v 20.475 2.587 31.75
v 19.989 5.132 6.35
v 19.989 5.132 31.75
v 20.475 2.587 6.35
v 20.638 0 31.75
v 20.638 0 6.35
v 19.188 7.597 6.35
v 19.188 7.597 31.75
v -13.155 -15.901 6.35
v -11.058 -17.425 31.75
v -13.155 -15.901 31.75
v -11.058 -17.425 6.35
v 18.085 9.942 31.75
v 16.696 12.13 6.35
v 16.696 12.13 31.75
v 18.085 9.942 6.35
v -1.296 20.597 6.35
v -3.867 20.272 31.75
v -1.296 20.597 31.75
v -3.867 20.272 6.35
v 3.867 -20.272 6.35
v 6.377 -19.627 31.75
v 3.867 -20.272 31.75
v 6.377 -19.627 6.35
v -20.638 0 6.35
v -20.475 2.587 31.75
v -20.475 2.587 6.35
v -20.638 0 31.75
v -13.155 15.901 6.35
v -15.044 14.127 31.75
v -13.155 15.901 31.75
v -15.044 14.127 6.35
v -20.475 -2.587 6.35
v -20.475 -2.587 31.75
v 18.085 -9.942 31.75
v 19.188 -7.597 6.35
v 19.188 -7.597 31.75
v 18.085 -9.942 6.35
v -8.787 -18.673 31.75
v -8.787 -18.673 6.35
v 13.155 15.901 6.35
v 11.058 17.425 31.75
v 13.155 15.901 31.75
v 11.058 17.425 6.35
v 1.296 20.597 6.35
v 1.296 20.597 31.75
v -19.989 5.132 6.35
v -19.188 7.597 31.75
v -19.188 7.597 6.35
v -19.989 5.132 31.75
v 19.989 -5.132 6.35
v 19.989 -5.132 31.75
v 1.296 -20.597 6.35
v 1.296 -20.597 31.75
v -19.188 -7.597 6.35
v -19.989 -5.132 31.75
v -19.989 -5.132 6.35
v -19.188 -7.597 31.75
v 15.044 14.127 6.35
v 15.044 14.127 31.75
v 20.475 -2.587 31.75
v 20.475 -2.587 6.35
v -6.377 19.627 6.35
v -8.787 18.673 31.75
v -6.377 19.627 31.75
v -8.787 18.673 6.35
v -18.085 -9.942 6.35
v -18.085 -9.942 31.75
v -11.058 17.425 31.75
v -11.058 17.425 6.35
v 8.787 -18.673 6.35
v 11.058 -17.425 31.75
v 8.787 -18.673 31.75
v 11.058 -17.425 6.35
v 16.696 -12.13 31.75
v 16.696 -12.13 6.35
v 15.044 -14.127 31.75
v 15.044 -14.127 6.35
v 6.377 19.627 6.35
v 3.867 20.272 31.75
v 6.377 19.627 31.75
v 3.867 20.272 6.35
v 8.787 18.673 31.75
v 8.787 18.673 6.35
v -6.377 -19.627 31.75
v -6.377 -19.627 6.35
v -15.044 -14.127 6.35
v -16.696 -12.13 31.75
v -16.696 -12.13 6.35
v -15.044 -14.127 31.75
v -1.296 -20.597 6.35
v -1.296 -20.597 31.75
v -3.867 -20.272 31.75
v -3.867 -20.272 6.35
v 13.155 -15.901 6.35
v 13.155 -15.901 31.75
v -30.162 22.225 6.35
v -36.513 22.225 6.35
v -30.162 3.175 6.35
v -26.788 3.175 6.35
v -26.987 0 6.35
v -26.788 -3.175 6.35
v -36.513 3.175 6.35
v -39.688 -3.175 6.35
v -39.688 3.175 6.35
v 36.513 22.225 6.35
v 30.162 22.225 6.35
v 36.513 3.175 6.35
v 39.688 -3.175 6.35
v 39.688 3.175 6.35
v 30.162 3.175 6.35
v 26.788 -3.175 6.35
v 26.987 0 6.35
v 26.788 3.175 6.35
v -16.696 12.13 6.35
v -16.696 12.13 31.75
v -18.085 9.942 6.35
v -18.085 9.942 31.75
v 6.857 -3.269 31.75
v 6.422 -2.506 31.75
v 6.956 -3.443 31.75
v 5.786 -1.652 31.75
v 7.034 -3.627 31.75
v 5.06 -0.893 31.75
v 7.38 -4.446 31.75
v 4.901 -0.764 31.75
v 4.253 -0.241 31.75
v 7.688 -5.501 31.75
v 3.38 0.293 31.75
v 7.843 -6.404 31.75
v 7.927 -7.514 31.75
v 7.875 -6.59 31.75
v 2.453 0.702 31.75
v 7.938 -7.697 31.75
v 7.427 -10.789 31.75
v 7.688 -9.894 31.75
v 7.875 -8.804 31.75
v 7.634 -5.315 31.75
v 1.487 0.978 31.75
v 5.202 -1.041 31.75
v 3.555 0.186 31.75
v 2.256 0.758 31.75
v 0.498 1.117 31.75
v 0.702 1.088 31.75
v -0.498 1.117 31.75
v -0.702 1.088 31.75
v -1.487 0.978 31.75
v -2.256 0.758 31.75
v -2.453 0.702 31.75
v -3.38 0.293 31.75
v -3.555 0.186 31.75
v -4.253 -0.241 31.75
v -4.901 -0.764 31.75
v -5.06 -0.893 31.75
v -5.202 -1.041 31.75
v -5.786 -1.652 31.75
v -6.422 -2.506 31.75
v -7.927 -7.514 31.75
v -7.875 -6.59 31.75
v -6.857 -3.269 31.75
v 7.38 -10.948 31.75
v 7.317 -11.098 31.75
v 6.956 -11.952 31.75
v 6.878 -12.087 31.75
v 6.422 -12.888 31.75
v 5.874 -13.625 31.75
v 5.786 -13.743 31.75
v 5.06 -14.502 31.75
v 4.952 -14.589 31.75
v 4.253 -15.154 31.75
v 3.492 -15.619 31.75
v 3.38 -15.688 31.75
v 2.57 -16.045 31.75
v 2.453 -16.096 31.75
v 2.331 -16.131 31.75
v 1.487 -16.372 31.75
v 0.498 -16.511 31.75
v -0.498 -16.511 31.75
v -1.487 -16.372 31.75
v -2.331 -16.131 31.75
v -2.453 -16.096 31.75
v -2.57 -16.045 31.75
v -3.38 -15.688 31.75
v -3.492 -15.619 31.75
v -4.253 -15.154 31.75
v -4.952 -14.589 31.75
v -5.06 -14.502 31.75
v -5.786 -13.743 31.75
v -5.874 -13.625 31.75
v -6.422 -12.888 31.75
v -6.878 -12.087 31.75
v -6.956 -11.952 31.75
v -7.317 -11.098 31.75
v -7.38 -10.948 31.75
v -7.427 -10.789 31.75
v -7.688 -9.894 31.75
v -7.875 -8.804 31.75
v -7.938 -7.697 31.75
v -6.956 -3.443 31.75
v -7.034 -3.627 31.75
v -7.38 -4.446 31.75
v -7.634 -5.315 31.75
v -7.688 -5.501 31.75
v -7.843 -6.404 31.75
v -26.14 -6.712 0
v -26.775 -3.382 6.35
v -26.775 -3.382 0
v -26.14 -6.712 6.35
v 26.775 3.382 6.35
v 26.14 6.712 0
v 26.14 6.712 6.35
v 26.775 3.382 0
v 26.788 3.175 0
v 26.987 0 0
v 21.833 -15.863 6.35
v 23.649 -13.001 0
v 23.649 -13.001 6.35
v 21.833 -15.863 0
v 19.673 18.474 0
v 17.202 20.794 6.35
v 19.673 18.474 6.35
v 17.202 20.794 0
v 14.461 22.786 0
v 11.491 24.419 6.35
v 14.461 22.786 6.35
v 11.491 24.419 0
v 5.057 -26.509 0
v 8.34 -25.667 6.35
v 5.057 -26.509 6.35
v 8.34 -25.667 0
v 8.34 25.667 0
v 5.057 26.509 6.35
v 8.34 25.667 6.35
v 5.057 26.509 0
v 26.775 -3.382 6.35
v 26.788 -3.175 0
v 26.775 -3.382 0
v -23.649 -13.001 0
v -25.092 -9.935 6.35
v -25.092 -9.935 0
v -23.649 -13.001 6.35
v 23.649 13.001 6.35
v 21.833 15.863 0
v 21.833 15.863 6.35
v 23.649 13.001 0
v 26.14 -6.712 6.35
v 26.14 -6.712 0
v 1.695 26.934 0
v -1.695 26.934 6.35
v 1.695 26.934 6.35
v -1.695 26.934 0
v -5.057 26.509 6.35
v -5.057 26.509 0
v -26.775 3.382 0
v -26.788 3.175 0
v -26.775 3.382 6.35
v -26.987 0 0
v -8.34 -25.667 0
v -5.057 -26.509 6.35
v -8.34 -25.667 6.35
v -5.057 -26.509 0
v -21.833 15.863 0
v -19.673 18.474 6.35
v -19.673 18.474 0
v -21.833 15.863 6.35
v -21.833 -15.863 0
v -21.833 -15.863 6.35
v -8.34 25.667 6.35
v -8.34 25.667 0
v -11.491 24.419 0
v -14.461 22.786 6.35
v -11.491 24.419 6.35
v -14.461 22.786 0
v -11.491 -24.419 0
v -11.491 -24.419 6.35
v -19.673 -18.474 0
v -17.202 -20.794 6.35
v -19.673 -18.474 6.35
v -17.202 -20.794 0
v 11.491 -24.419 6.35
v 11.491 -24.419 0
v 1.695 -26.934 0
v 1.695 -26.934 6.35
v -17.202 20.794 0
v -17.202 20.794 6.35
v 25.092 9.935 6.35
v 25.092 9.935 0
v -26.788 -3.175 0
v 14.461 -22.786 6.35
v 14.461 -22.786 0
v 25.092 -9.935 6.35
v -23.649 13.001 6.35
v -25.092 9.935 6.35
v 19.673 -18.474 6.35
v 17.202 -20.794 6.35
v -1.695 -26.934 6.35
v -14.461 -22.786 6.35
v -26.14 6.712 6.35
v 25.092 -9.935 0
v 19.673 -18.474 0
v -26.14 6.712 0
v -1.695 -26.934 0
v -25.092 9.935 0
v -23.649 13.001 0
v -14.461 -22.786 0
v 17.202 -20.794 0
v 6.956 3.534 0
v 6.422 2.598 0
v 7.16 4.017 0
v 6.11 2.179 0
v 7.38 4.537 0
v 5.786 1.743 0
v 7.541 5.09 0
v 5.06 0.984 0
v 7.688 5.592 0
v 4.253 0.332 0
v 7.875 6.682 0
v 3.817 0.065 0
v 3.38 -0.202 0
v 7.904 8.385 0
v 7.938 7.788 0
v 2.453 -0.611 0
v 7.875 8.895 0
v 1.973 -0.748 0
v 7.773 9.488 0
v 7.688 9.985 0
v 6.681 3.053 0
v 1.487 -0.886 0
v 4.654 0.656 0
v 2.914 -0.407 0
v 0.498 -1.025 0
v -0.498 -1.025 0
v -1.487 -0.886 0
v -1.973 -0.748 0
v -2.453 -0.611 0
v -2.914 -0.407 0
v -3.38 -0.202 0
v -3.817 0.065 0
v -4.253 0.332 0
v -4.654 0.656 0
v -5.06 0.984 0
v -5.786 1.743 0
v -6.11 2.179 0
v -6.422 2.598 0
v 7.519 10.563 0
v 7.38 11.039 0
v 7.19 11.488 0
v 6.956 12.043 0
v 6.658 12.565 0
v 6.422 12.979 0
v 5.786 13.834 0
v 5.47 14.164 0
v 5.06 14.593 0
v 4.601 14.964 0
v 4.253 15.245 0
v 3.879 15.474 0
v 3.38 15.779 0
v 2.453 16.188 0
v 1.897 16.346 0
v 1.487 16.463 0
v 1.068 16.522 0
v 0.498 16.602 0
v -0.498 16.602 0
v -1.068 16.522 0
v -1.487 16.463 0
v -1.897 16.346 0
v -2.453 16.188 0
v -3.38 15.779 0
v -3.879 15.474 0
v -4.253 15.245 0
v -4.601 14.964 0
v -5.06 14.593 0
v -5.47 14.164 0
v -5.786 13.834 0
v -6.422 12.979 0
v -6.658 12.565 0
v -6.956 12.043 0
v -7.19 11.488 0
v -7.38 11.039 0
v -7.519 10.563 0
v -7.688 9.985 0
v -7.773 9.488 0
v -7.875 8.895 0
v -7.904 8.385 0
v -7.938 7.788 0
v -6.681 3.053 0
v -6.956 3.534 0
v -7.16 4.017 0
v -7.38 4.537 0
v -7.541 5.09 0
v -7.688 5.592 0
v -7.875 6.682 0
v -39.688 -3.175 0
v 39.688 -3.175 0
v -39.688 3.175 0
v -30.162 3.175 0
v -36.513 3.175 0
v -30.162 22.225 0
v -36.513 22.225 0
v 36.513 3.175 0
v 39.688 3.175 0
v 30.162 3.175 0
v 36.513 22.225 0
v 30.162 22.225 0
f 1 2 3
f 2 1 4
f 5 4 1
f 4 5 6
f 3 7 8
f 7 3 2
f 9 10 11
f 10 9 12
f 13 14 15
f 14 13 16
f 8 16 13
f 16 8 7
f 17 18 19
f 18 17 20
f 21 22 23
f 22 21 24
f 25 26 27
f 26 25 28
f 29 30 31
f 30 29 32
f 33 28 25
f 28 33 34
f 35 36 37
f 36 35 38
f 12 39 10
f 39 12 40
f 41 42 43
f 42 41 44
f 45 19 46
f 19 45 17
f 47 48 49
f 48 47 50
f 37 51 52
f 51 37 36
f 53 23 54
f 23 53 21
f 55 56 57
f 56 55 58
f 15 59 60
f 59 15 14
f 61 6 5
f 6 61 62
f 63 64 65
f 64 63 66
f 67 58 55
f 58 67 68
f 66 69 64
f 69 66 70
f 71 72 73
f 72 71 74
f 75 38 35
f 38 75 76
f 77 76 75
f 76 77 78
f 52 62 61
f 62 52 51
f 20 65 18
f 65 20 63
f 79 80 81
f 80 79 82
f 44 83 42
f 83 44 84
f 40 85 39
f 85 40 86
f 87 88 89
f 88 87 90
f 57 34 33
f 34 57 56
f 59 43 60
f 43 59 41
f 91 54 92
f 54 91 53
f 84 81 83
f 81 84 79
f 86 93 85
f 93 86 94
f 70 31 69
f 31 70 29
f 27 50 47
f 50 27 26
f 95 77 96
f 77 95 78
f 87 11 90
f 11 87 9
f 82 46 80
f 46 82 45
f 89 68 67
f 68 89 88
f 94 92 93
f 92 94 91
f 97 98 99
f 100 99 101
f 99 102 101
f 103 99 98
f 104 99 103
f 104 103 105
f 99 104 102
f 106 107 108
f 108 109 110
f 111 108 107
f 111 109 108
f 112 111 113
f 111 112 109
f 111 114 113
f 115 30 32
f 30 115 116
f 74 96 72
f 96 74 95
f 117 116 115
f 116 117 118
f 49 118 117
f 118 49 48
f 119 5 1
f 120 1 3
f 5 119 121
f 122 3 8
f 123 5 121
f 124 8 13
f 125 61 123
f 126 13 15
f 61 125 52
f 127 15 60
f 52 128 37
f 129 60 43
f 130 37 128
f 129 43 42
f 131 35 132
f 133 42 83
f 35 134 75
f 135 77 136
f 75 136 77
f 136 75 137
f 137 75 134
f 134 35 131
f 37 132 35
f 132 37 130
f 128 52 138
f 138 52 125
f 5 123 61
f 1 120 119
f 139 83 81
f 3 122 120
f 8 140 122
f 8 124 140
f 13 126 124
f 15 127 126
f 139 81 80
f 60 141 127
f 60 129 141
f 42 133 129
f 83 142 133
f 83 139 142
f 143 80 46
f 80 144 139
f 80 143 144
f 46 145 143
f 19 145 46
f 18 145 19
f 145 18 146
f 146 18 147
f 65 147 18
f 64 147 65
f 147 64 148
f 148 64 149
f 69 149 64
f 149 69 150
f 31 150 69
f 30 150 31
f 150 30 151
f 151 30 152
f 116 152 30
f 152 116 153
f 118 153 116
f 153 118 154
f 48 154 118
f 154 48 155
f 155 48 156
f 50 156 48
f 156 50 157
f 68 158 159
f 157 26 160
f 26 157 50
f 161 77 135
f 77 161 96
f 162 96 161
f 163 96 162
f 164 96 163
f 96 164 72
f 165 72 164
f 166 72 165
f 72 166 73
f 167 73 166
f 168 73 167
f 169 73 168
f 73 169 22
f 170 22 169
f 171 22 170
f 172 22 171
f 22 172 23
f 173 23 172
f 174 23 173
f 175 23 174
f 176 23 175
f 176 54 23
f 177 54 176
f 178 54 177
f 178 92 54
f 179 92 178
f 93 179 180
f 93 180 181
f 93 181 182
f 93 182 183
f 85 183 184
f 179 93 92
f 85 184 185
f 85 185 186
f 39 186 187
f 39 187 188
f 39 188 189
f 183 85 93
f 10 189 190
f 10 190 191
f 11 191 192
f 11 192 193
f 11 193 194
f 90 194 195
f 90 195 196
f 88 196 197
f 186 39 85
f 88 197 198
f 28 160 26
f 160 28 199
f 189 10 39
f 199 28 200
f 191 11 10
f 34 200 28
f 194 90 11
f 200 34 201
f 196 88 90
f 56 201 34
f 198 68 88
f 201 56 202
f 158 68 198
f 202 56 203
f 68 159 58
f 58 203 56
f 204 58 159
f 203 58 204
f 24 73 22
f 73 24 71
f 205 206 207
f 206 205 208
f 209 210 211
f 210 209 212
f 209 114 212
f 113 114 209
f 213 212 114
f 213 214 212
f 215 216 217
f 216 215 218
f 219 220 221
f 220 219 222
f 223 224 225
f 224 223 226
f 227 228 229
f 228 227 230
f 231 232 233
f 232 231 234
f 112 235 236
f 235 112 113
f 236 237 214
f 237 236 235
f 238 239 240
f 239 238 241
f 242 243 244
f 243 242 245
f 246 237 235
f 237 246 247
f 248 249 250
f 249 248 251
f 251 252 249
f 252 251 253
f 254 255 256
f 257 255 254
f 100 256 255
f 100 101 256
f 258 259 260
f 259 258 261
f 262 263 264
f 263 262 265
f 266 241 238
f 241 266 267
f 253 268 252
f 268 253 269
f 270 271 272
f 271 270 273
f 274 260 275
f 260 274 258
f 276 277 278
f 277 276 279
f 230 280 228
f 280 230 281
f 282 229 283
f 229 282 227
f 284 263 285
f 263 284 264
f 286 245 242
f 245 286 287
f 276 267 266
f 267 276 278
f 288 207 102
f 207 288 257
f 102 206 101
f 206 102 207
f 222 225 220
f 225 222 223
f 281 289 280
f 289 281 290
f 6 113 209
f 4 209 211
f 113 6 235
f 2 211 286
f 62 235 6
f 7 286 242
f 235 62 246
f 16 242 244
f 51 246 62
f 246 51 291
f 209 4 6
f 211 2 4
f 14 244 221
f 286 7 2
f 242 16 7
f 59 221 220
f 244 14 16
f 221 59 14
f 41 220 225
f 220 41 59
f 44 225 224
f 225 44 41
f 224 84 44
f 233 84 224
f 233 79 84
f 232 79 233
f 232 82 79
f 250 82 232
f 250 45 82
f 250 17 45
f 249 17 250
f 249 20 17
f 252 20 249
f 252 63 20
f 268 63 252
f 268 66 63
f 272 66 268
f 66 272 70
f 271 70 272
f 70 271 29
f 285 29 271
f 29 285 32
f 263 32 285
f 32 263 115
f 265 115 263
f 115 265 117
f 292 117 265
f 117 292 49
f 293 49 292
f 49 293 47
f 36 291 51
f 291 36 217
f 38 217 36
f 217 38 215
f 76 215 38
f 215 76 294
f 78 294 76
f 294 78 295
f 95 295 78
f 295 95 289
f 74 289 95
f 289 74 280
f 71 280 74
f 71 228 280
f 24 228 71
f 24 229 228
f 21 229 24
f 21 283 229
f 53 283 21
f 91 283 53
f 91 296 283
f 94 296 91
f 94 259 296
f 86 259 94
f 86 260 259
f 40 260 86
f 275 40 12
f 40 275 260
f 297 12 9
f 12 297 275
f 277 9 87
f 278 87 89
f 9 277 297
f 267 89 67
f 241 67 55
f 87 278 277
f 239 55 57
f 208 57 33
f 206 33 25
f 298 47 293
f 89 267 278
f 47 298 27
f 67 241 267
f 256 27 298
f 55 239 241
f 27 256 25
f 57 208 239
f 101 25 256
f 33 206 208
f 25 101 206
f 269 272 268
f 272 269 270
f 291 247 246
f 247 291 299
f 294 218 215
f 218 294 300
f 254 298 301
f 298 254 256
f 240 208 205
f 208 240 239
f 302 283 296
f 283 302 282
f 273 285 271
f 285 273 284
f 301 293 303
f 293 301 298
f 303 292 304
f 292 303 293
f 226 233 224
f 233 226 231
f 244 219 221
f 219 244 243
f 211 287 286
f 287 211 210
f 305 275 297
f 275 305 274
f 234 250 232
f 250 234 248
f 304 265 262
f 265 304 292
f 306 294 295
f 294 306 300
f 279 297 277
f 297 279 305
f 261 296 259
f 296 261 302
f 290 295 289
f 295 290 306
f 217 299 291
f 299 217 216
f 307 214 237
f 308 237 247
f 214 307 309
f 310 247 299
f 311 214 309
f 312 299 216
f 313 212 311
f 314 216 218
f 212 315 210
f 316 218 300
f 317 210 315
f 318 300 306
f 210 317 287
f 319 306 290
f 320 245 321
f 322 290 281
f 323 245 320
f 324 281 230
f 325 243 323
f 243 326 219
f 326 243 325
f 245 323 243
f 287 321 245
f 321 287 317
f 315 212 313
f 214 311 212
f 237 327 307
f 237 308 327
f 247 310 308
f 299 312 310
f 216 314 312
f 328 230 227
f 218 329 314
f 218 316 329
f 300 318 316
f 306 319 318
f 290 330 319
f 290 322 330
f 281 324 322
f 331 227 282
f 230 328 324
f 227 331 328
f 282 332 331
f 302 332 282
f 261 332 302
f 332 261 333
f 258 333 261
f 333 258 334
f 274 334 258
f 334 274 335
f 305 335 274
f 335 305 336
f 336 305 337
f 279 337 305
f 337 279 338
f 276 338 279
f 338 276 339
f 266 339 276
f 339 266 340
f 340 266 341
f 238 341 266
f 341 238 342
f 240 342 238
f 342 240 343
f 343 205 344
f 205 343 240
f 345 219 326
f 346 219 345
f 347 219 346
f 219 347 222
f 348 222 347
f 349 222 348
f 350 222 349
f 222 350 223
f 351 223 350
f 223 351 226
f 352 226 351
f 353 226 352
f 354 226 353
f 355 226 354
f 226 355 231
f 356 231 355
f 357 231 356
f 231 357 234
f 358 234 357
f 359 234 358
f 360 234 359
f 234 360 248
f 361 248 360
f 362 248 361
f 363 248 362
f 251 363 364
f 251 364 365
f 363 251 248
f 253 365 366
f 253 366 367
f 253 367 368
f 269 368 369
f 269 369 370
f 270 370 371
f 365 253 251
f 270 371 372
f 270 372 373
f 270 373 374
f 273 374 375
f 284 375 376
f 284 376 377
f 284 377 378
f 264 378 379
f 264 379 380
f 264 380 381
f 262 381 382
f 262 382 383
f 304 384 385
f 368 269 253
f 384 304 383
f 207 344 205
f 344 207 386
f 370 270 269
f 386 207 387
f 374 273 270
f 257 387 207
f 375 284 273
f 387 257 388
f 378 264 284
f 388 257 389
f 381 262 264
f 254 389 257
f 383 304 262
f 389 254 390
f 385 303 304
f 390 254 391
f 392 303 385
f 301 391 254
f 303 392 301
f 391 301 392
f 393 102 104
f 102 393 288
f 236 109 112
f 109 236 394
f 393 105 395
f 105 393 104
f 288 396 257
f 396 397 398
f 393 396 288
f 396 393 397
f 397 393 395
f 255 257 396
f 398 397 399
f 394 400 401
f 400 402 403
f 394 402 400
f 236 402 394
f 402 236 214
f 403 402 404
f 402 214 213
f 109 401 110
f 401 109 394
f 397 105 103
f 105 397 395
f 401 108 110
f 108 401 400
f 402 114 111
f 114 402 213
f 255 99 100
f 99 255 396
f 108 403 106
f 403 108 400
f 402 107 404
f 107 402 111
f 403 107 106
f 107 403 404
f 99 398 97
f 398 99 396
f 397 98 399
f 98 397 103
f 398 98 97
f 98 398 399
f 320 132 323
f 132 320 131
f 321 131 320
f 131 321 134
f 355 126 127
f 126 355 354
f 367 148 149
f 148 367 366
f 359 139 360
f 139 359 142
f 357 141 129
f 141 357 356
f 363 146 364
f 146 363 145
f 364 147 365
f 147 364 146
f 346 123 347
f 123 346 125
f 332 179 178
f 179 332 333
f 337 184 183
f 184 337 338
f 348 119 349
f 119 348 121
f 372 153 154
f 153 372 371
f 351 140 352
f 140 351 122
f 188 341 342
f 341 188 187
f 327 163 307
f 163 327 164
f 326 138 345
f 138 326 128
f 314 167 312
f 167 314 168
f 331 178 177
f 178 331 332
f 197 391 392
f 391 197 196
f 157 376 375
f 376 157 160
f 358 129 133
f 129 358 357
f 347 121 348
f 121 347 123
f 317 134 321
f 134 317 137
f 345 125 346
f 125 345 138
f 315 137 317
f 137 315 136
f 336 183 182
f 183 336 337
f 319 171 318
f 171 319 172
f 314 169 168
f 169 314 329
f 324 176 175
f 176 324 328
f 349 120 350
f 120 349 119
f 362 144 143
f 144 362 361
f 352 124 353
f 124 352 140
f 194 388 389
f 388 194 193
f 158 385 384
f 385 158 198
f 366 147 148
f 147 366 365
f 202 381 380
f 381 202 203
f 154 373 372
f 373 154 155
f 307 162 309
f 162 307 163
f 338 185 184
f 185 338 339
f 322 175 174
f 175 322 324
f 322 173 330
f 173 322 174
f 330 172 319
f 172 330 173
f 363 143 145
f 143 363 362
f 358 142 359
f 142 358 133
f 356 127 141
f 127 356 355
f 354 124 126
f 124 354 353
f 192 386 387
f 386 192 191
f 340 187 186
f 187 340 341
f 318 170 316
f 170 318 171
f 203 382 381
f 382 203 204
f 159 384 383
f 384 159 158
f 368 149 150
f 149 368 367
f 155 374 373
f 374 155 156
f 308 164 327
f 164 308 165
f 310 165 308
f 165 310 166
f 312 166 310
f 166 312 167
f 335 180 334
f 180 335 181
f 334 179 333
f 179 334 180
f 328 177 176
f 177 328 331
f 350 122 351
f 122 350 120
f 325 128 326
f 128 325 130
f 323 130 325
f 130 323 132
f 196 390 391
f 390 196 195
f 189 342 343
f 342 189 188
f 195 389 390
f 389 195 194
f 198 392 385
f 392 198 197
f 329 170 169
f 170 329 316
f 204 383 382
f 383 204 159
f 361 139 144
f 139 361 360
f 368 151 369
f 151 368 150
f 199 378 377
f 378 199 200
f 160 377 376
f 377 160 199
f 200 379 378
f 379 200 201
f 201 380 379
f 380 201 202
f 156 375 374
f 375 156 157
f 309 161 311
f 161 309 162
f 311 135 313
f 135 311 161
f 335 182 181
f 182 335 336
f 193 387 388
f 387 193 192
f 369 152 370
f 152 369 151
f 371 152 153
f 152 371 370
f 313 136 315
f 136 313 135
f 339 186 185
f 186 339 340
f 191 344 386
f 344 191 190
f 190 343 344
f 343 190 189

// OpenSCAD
// this part gets gripped in the bracket on the end of the robot's wrist, and holds a pen.
// the wings are for a rubber band to be stretched around, to push the pen downward.
// don't ask me what keeps the pen from falling out when it's lifted away from the paper.

penDiameter = (40/64)*25.4; // diameter of the pen

grabbedRadius = (1+5/8)*25.4/2; // where the bracket clamps onto it is 1+5/8"
grabbedHeight = (1)*25.4; // clamped part height
hatRadius = (1+5/8+1/2)*25.4/2; // the top hat 
hatHeight = 0.25*25.4; // thickness of hat (everything is printed upside down)

holeHeight = (grabbedHeight+hatHeight)*3; // a cylinder for the marker pen to ride in
holeRadius = penDiameter/2; // radius of the pen hole

$fn = 50; // how many panels make up a cylinder shape

difference() {
  union() { // all these things together are the first line of difference()
    translate([0,0,grabbedHeight/2+hatHeight]) cylinder(r = grabbedRadius, h = grabbedHeight,center=true); // grabbed part
    translate([0,0,hatHeight/2]) cylinder(r = hatRadius, h = hatHeight+0.001,center=true); // brim of "hat" shape
    translate([0,0,hatHeight/2]) rotate([0,0,90]) cube([hatHeight,hatRadius*2+hatHeight*4,hatHeight],center=true); // wingarm
    translate([hatRadius+hatHeight,hatHeight*1.5,hatHeight/2]) cube([hatHeight,hatHeight*4,hatHeight],center=true); // wing
    translate([-1*(hatRadius+hatHeight),hatHeight*1.5,hatHeight/2]) cube([hatHeight,hatHeight*4,hatHeight],center=true); // wing
  }
  // when the robot's manipulator is straight down, the grabbed part is tilted 26 degrees.
  rotate([26,0,0]) translate([0,7,0]) cylinder(r = holeRadius, h = holeHeight,center=true); // penhole
}
